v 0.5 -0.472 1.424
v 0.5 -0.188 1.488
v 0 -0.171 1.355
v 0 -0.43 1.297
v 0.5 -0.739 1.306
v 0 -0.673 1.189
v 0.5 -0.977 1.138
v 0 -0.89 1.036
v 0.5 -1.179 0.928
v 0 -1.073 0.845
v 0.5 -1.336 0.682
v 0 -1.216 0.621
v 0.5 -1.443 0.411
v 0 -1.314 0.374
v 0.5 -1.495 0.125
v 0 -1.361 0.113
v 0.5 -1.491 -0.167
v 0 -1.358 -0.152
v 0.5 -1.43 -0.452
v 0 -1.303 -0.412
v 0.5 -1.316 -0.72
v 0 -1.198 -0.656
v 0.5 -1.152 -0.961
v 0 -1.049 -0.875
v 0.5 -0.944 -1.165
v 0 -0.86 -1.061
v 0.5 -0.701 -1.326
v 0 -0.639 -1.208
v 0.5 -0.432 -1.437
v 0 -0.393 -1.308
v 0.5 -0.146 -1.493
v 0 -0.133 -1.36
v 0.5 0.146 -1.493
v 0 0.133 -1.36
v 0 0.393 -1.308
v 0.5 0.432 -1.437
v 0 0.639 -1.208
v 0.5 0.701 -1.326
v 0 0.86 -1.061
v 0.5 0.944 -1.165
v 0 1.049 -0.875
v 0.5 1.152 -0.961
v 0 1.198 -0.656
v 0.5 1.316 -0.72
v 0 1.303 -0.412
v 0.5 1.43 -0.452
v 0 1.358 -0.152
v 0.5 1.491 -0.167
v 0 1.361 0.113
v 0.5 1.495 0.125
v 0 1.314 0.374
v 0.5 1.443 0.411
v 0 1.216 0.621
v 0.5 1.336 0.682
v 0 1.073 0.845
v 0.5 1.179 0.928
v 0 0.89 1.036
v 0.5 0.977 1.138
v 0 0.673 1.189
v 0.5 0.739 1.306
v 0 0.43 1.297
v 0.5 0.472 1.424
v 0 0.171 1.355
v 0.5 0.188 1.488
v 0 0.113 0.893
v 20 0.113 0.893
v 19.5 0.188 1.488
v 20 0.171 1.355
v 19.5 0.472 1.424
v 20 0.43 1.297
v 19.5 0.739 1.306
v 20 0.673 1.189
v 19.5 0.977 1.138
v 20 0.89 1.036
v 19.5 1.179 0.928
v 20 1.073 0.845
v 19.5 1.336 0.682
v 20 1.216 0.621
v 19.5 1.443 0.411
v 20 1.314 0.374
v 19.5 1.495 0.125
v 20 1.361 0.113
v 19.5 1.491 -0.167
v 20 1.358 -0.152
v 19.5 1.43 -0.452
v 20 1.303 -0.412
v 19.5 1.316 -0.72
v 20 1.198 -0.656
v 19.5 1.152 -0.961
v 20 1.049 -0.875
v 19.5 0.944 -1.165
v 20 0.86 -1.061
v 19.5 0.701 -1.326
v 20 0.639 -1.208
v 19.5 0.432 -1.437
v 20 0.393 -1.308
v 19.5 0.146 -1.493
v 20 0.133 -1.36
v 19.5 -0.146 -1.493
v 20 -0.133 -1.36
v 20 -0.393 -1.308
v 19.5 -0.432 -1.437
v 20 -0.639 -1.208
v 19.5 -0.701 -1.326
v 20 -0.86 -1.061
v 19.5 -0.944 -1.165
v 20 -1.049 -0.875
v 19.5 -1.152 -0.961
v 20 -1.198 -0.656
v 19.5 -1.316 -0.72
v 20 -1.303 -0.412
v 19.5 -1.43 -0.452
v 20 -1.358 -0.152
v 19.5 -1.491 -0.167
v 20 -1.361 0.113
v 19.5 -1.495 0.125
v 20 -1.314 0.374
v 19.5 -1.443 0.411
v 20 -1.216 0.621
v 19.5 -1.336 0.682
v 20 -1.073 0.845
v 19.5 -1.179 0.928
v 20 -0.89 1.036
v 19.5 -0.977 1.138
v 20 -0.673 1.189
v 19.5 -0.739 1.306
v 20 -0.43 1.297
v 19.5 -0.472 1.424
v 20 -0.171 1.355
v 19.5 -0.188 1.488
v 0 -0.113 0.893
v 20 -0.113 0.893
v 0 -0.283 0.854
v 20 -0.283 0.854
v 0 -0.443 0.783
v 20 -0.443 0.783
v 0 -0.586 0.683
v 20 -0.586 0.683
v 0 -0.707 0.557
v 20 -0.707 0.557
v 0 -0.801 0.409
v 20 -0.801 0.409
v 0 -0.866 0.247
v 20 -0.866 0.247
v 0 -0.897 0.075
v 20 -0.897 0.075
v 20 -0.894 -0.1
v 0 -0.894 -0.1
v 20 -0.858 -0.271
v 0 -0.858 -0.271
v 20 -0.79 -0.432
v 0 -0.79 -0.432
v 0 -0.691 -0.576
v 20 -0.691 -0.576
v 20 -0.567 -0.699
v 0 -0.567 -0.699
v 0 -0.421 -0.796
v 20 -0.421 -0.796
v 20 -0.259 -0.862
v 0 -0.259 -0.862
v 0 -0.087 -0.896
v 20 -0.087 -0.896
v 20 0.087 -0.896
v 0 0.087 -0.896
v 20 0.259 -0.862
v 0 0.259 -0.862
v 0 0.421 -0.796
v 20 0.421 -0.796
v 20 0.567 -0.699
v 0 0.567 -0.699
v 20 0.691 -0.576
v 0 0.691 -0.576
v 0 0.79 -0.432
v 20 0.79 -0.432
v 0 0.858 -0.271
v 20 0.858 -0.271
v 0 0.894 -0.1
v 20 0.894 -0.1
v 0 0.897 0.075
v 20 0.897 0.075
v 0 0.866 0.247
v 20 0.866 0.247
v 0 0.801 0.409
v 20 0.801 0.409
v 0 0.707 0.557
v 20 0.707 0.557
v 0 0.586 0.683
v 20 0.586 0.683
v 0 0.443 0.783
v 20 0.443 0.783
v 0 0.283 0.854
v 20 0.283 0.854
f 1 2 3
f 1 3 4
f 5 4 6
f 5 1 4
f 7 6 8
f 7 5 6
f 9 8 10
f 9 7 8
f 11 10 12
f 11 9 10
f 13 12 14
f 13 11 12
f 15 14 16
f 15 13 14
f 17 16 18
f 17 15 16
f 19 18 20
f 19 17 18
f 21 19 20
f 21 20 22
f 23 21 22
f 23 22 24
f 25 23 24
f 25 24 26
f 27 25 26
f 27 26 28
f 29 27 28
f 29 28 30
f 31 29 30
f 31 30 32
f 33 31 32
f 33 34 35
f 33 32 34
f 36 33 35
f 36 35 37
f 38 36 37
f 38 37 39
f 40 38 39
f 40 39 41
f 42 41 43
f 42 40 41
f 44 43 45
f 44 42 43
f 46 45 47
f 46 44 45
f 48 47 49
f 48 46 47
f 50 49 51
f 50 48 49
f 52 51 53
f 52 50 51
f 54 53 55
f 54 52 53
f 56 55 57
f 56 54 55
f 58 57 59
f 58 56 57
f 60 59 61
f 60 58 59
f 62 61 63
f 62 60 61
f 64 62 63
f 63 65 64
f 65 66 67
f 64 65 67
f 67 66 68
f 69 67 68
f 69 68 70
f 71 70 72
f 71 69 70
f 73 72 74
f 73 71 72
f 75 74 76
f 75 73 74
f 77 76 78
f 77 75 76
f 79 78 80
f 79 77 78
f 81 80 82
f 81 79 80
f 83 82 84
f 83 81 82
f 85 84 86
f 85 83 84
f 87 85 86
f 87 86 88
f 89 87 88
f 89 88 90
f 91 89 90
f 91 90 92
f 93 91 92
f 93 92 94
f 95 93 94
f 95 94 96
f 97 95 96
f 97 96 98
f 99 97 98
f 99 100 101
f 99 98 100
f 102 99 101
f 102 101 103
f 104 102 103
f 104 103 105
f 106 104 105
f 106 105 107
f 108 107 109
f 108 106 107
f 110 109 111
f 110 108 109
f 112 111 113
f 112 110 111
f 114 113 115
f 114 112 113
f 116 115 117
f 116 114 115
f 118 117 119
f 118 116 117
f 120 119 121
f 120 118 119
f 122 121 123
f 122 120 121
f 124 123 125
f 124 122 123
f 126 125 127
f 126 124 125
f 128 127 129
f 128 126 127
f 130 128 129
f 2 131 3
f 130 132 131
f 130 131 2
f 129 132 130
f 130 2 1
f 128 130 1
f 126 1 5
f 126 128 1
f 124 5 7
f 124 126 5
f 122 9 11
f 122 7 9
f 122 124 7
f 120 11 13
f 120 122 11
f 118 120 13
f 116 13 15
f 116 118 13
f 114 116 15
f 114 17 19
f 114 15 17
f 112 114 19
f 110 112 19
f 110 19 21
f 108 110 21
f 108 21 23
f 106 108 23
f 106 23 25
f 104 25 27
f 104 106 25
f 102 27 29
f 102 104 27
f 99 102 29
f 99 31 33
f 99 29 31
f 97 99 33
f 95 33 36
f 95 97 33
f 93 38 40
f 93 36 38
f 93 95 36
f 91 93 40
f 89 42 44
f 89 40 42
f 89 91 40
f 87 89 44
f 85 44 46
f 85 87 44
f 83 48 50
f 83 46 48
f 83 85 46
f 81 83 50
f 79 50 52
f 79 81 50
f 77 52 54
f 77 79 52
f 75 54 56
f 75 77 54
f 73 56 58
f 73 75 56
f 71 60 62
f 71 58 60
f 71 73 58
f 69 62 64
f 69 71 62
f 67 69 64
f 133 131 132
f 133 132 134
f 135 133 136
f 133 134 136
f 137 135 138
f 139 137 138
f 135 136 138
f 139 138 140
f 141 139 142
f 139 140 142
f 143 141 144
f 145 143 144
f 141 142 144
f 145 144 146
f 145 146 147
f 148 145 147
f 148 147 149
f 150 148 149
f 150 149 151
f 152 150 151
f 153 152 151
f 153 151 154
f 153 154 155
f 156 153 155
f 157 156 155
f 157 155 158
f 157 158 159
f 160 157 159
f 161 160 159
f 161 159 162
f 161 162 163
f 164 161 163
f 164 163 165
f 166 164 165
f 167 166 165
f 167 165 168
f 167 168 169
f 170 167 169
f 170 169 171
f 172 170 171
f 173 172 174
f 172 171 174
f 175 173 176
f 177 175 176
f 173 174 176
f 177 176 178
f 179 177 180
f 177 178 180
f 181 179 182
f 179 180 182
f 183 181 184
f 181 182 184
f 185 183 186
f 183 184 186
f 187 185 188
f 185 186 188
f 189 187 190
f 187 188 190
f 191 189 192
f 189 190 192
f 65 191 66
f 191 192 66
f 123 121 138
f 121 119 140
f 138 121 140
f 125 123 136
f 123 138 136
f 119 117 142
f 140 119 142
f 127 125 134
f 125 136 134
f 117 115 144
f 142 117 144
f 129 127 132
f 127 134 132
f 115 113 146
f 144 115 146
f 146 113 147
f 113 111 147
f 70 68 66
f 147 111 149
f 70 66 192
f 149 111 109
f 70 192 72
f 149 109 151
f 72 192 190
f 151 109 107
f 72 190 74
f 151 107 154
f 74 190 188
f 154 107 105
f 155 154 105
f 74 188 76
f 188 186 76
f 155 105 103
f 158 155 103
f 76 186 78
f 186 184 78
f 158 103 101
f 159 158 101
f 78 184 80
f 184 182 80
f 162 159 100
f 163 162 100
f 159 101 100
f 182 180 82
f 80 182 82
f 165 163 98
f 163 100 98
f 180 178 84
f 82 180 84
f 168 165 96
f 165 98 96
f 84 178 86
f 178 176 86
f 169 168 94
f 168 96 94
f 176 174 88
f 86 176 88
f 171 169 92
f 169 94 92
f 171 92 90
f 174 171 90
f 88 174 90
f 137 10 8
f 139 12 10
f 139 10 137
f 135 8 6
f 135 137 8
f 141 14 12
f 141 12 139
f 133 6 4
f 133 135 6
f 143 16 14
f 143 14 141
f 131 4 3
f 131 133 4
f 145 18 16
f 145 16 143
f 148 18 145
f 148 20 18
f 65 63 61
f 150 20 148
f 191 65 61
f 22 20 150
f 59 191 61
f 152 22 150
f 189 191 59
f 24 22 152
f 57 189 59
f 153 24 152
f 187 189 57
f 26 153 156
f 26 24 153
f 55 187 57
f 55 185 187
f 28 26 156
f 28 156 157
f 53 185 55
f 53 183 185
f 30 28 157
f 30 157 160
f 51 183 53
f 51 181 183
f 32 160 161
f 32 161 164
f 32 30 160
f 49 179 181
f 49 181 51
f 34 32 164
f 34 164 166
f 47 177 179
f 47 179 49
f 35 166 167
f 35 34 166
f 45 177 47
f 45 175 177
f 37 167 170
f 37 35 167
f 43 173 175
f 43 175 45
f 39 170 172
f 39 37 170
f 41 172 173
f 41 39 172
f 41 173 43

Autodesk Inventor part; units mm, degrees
ref_plane "YZ Plane" through (0, 0, 0) normal (1, 0, 0) x (0, 1, 0)
ref_plane "XZ Plane" through (0, 0, 0) normal (0, 1, 0) x (-1, 0, 0)
sketch "Sketch1" plane through (0, 0, 0) normal (0, 0, 1) x (1, 0, 0)
  line L0 (0, 0.9) -> (0, 1.366)
  line L1 (0, 1.366) -> (0.5, 1.5)
  line L2 (0.5, 1.5) -> (19.5, 1.5)
  line L3 (19.5, 1.5) -> (20, 1.366)
  line L4 (20, 1.366) -> (20, 0.9)
  line L5 (20, 0) -> (0, 0)
  line L6 (0, 0.9) -> (20, 0.9)
  line L7 (0, 0.9) -> (0, 0) construction
  line L8 (20, 0.9) -> (20, 0) construction
  line L9 (0, 1.5) -> (0, -0.25) projected
  line L10 (-2, 0) -> (12, 0) projected
  dimension "d0" = 20
  dimension "d1" = 3
  dimension "d2" = 1.8
  dimension "d3" = 15
  dimension "d4" = 15
  dimension "d7" = 0.134
  dimension "d8" = 0.134
revolve "Body" add sketch "Sketch1" angle 360 about axis through (20, 0, 0) along (-1, 0, 0)
ref_plane "IDS_WORKPLANE{1}" through (10, 0, 0) normal (1, 0, 0) x (0, 1, 0)
sketch "Sketch2" plane through (10, 0, 0) normal (1, 0, 0) x (0, 1, 0)
  arc A0 (0.188, 1.4882) -> (-0.188, 1.4882) centre (0, 0) ccw
  arc A1 (0.1128, 0.8929) -> (-0.1128, 0.8929) centre (0, 0) ccw
  line L0 (-0.1128, 0.8929) -> (-0.188, 1.4882)
  line L1 (0.1128, 0.8929) -> (0.188, 1.4882)
  line L2 (0, 1.5) -> (0, -0.25) projected
  line L3 (-0.2193, 0) -> (0.2193, 0) projected
  dimension "d11" = 1.5
  dimension "d12" = 0.9
  dimension "d14" = 0.6
  dimension "d15" = 7.2
extrude "Cut" cut sketch "Sketch2" against normal mid plane 20
equation "\"d0\" = NLG"
equation "\"d1\" = NND"
equation "\"d2\" = NND - 2 * SD"
equation "\"d3\" = FAWI"
equation "\"d4\" = FAWI"
equation "\"d11\" = 0.5 * NND"
equation "\"d12\" = -SD + 0.5 * NND"
equation "\"d14\" = SD"
equation "\"d5\" = NLG"
equation "\"NND\" = 3"
equation "\"NLG\" = 20"
equation "\"SD\" = 0.6"
equation "\"PHH\" = 0.5"
equation "\"PHH1\" = 0.5"
equation "\"FAWI\" = 15deg"
equation "\"NND1\" = 3.5"
properties part number "ISO 8752 - 3 x 20  A" material "Steel"
